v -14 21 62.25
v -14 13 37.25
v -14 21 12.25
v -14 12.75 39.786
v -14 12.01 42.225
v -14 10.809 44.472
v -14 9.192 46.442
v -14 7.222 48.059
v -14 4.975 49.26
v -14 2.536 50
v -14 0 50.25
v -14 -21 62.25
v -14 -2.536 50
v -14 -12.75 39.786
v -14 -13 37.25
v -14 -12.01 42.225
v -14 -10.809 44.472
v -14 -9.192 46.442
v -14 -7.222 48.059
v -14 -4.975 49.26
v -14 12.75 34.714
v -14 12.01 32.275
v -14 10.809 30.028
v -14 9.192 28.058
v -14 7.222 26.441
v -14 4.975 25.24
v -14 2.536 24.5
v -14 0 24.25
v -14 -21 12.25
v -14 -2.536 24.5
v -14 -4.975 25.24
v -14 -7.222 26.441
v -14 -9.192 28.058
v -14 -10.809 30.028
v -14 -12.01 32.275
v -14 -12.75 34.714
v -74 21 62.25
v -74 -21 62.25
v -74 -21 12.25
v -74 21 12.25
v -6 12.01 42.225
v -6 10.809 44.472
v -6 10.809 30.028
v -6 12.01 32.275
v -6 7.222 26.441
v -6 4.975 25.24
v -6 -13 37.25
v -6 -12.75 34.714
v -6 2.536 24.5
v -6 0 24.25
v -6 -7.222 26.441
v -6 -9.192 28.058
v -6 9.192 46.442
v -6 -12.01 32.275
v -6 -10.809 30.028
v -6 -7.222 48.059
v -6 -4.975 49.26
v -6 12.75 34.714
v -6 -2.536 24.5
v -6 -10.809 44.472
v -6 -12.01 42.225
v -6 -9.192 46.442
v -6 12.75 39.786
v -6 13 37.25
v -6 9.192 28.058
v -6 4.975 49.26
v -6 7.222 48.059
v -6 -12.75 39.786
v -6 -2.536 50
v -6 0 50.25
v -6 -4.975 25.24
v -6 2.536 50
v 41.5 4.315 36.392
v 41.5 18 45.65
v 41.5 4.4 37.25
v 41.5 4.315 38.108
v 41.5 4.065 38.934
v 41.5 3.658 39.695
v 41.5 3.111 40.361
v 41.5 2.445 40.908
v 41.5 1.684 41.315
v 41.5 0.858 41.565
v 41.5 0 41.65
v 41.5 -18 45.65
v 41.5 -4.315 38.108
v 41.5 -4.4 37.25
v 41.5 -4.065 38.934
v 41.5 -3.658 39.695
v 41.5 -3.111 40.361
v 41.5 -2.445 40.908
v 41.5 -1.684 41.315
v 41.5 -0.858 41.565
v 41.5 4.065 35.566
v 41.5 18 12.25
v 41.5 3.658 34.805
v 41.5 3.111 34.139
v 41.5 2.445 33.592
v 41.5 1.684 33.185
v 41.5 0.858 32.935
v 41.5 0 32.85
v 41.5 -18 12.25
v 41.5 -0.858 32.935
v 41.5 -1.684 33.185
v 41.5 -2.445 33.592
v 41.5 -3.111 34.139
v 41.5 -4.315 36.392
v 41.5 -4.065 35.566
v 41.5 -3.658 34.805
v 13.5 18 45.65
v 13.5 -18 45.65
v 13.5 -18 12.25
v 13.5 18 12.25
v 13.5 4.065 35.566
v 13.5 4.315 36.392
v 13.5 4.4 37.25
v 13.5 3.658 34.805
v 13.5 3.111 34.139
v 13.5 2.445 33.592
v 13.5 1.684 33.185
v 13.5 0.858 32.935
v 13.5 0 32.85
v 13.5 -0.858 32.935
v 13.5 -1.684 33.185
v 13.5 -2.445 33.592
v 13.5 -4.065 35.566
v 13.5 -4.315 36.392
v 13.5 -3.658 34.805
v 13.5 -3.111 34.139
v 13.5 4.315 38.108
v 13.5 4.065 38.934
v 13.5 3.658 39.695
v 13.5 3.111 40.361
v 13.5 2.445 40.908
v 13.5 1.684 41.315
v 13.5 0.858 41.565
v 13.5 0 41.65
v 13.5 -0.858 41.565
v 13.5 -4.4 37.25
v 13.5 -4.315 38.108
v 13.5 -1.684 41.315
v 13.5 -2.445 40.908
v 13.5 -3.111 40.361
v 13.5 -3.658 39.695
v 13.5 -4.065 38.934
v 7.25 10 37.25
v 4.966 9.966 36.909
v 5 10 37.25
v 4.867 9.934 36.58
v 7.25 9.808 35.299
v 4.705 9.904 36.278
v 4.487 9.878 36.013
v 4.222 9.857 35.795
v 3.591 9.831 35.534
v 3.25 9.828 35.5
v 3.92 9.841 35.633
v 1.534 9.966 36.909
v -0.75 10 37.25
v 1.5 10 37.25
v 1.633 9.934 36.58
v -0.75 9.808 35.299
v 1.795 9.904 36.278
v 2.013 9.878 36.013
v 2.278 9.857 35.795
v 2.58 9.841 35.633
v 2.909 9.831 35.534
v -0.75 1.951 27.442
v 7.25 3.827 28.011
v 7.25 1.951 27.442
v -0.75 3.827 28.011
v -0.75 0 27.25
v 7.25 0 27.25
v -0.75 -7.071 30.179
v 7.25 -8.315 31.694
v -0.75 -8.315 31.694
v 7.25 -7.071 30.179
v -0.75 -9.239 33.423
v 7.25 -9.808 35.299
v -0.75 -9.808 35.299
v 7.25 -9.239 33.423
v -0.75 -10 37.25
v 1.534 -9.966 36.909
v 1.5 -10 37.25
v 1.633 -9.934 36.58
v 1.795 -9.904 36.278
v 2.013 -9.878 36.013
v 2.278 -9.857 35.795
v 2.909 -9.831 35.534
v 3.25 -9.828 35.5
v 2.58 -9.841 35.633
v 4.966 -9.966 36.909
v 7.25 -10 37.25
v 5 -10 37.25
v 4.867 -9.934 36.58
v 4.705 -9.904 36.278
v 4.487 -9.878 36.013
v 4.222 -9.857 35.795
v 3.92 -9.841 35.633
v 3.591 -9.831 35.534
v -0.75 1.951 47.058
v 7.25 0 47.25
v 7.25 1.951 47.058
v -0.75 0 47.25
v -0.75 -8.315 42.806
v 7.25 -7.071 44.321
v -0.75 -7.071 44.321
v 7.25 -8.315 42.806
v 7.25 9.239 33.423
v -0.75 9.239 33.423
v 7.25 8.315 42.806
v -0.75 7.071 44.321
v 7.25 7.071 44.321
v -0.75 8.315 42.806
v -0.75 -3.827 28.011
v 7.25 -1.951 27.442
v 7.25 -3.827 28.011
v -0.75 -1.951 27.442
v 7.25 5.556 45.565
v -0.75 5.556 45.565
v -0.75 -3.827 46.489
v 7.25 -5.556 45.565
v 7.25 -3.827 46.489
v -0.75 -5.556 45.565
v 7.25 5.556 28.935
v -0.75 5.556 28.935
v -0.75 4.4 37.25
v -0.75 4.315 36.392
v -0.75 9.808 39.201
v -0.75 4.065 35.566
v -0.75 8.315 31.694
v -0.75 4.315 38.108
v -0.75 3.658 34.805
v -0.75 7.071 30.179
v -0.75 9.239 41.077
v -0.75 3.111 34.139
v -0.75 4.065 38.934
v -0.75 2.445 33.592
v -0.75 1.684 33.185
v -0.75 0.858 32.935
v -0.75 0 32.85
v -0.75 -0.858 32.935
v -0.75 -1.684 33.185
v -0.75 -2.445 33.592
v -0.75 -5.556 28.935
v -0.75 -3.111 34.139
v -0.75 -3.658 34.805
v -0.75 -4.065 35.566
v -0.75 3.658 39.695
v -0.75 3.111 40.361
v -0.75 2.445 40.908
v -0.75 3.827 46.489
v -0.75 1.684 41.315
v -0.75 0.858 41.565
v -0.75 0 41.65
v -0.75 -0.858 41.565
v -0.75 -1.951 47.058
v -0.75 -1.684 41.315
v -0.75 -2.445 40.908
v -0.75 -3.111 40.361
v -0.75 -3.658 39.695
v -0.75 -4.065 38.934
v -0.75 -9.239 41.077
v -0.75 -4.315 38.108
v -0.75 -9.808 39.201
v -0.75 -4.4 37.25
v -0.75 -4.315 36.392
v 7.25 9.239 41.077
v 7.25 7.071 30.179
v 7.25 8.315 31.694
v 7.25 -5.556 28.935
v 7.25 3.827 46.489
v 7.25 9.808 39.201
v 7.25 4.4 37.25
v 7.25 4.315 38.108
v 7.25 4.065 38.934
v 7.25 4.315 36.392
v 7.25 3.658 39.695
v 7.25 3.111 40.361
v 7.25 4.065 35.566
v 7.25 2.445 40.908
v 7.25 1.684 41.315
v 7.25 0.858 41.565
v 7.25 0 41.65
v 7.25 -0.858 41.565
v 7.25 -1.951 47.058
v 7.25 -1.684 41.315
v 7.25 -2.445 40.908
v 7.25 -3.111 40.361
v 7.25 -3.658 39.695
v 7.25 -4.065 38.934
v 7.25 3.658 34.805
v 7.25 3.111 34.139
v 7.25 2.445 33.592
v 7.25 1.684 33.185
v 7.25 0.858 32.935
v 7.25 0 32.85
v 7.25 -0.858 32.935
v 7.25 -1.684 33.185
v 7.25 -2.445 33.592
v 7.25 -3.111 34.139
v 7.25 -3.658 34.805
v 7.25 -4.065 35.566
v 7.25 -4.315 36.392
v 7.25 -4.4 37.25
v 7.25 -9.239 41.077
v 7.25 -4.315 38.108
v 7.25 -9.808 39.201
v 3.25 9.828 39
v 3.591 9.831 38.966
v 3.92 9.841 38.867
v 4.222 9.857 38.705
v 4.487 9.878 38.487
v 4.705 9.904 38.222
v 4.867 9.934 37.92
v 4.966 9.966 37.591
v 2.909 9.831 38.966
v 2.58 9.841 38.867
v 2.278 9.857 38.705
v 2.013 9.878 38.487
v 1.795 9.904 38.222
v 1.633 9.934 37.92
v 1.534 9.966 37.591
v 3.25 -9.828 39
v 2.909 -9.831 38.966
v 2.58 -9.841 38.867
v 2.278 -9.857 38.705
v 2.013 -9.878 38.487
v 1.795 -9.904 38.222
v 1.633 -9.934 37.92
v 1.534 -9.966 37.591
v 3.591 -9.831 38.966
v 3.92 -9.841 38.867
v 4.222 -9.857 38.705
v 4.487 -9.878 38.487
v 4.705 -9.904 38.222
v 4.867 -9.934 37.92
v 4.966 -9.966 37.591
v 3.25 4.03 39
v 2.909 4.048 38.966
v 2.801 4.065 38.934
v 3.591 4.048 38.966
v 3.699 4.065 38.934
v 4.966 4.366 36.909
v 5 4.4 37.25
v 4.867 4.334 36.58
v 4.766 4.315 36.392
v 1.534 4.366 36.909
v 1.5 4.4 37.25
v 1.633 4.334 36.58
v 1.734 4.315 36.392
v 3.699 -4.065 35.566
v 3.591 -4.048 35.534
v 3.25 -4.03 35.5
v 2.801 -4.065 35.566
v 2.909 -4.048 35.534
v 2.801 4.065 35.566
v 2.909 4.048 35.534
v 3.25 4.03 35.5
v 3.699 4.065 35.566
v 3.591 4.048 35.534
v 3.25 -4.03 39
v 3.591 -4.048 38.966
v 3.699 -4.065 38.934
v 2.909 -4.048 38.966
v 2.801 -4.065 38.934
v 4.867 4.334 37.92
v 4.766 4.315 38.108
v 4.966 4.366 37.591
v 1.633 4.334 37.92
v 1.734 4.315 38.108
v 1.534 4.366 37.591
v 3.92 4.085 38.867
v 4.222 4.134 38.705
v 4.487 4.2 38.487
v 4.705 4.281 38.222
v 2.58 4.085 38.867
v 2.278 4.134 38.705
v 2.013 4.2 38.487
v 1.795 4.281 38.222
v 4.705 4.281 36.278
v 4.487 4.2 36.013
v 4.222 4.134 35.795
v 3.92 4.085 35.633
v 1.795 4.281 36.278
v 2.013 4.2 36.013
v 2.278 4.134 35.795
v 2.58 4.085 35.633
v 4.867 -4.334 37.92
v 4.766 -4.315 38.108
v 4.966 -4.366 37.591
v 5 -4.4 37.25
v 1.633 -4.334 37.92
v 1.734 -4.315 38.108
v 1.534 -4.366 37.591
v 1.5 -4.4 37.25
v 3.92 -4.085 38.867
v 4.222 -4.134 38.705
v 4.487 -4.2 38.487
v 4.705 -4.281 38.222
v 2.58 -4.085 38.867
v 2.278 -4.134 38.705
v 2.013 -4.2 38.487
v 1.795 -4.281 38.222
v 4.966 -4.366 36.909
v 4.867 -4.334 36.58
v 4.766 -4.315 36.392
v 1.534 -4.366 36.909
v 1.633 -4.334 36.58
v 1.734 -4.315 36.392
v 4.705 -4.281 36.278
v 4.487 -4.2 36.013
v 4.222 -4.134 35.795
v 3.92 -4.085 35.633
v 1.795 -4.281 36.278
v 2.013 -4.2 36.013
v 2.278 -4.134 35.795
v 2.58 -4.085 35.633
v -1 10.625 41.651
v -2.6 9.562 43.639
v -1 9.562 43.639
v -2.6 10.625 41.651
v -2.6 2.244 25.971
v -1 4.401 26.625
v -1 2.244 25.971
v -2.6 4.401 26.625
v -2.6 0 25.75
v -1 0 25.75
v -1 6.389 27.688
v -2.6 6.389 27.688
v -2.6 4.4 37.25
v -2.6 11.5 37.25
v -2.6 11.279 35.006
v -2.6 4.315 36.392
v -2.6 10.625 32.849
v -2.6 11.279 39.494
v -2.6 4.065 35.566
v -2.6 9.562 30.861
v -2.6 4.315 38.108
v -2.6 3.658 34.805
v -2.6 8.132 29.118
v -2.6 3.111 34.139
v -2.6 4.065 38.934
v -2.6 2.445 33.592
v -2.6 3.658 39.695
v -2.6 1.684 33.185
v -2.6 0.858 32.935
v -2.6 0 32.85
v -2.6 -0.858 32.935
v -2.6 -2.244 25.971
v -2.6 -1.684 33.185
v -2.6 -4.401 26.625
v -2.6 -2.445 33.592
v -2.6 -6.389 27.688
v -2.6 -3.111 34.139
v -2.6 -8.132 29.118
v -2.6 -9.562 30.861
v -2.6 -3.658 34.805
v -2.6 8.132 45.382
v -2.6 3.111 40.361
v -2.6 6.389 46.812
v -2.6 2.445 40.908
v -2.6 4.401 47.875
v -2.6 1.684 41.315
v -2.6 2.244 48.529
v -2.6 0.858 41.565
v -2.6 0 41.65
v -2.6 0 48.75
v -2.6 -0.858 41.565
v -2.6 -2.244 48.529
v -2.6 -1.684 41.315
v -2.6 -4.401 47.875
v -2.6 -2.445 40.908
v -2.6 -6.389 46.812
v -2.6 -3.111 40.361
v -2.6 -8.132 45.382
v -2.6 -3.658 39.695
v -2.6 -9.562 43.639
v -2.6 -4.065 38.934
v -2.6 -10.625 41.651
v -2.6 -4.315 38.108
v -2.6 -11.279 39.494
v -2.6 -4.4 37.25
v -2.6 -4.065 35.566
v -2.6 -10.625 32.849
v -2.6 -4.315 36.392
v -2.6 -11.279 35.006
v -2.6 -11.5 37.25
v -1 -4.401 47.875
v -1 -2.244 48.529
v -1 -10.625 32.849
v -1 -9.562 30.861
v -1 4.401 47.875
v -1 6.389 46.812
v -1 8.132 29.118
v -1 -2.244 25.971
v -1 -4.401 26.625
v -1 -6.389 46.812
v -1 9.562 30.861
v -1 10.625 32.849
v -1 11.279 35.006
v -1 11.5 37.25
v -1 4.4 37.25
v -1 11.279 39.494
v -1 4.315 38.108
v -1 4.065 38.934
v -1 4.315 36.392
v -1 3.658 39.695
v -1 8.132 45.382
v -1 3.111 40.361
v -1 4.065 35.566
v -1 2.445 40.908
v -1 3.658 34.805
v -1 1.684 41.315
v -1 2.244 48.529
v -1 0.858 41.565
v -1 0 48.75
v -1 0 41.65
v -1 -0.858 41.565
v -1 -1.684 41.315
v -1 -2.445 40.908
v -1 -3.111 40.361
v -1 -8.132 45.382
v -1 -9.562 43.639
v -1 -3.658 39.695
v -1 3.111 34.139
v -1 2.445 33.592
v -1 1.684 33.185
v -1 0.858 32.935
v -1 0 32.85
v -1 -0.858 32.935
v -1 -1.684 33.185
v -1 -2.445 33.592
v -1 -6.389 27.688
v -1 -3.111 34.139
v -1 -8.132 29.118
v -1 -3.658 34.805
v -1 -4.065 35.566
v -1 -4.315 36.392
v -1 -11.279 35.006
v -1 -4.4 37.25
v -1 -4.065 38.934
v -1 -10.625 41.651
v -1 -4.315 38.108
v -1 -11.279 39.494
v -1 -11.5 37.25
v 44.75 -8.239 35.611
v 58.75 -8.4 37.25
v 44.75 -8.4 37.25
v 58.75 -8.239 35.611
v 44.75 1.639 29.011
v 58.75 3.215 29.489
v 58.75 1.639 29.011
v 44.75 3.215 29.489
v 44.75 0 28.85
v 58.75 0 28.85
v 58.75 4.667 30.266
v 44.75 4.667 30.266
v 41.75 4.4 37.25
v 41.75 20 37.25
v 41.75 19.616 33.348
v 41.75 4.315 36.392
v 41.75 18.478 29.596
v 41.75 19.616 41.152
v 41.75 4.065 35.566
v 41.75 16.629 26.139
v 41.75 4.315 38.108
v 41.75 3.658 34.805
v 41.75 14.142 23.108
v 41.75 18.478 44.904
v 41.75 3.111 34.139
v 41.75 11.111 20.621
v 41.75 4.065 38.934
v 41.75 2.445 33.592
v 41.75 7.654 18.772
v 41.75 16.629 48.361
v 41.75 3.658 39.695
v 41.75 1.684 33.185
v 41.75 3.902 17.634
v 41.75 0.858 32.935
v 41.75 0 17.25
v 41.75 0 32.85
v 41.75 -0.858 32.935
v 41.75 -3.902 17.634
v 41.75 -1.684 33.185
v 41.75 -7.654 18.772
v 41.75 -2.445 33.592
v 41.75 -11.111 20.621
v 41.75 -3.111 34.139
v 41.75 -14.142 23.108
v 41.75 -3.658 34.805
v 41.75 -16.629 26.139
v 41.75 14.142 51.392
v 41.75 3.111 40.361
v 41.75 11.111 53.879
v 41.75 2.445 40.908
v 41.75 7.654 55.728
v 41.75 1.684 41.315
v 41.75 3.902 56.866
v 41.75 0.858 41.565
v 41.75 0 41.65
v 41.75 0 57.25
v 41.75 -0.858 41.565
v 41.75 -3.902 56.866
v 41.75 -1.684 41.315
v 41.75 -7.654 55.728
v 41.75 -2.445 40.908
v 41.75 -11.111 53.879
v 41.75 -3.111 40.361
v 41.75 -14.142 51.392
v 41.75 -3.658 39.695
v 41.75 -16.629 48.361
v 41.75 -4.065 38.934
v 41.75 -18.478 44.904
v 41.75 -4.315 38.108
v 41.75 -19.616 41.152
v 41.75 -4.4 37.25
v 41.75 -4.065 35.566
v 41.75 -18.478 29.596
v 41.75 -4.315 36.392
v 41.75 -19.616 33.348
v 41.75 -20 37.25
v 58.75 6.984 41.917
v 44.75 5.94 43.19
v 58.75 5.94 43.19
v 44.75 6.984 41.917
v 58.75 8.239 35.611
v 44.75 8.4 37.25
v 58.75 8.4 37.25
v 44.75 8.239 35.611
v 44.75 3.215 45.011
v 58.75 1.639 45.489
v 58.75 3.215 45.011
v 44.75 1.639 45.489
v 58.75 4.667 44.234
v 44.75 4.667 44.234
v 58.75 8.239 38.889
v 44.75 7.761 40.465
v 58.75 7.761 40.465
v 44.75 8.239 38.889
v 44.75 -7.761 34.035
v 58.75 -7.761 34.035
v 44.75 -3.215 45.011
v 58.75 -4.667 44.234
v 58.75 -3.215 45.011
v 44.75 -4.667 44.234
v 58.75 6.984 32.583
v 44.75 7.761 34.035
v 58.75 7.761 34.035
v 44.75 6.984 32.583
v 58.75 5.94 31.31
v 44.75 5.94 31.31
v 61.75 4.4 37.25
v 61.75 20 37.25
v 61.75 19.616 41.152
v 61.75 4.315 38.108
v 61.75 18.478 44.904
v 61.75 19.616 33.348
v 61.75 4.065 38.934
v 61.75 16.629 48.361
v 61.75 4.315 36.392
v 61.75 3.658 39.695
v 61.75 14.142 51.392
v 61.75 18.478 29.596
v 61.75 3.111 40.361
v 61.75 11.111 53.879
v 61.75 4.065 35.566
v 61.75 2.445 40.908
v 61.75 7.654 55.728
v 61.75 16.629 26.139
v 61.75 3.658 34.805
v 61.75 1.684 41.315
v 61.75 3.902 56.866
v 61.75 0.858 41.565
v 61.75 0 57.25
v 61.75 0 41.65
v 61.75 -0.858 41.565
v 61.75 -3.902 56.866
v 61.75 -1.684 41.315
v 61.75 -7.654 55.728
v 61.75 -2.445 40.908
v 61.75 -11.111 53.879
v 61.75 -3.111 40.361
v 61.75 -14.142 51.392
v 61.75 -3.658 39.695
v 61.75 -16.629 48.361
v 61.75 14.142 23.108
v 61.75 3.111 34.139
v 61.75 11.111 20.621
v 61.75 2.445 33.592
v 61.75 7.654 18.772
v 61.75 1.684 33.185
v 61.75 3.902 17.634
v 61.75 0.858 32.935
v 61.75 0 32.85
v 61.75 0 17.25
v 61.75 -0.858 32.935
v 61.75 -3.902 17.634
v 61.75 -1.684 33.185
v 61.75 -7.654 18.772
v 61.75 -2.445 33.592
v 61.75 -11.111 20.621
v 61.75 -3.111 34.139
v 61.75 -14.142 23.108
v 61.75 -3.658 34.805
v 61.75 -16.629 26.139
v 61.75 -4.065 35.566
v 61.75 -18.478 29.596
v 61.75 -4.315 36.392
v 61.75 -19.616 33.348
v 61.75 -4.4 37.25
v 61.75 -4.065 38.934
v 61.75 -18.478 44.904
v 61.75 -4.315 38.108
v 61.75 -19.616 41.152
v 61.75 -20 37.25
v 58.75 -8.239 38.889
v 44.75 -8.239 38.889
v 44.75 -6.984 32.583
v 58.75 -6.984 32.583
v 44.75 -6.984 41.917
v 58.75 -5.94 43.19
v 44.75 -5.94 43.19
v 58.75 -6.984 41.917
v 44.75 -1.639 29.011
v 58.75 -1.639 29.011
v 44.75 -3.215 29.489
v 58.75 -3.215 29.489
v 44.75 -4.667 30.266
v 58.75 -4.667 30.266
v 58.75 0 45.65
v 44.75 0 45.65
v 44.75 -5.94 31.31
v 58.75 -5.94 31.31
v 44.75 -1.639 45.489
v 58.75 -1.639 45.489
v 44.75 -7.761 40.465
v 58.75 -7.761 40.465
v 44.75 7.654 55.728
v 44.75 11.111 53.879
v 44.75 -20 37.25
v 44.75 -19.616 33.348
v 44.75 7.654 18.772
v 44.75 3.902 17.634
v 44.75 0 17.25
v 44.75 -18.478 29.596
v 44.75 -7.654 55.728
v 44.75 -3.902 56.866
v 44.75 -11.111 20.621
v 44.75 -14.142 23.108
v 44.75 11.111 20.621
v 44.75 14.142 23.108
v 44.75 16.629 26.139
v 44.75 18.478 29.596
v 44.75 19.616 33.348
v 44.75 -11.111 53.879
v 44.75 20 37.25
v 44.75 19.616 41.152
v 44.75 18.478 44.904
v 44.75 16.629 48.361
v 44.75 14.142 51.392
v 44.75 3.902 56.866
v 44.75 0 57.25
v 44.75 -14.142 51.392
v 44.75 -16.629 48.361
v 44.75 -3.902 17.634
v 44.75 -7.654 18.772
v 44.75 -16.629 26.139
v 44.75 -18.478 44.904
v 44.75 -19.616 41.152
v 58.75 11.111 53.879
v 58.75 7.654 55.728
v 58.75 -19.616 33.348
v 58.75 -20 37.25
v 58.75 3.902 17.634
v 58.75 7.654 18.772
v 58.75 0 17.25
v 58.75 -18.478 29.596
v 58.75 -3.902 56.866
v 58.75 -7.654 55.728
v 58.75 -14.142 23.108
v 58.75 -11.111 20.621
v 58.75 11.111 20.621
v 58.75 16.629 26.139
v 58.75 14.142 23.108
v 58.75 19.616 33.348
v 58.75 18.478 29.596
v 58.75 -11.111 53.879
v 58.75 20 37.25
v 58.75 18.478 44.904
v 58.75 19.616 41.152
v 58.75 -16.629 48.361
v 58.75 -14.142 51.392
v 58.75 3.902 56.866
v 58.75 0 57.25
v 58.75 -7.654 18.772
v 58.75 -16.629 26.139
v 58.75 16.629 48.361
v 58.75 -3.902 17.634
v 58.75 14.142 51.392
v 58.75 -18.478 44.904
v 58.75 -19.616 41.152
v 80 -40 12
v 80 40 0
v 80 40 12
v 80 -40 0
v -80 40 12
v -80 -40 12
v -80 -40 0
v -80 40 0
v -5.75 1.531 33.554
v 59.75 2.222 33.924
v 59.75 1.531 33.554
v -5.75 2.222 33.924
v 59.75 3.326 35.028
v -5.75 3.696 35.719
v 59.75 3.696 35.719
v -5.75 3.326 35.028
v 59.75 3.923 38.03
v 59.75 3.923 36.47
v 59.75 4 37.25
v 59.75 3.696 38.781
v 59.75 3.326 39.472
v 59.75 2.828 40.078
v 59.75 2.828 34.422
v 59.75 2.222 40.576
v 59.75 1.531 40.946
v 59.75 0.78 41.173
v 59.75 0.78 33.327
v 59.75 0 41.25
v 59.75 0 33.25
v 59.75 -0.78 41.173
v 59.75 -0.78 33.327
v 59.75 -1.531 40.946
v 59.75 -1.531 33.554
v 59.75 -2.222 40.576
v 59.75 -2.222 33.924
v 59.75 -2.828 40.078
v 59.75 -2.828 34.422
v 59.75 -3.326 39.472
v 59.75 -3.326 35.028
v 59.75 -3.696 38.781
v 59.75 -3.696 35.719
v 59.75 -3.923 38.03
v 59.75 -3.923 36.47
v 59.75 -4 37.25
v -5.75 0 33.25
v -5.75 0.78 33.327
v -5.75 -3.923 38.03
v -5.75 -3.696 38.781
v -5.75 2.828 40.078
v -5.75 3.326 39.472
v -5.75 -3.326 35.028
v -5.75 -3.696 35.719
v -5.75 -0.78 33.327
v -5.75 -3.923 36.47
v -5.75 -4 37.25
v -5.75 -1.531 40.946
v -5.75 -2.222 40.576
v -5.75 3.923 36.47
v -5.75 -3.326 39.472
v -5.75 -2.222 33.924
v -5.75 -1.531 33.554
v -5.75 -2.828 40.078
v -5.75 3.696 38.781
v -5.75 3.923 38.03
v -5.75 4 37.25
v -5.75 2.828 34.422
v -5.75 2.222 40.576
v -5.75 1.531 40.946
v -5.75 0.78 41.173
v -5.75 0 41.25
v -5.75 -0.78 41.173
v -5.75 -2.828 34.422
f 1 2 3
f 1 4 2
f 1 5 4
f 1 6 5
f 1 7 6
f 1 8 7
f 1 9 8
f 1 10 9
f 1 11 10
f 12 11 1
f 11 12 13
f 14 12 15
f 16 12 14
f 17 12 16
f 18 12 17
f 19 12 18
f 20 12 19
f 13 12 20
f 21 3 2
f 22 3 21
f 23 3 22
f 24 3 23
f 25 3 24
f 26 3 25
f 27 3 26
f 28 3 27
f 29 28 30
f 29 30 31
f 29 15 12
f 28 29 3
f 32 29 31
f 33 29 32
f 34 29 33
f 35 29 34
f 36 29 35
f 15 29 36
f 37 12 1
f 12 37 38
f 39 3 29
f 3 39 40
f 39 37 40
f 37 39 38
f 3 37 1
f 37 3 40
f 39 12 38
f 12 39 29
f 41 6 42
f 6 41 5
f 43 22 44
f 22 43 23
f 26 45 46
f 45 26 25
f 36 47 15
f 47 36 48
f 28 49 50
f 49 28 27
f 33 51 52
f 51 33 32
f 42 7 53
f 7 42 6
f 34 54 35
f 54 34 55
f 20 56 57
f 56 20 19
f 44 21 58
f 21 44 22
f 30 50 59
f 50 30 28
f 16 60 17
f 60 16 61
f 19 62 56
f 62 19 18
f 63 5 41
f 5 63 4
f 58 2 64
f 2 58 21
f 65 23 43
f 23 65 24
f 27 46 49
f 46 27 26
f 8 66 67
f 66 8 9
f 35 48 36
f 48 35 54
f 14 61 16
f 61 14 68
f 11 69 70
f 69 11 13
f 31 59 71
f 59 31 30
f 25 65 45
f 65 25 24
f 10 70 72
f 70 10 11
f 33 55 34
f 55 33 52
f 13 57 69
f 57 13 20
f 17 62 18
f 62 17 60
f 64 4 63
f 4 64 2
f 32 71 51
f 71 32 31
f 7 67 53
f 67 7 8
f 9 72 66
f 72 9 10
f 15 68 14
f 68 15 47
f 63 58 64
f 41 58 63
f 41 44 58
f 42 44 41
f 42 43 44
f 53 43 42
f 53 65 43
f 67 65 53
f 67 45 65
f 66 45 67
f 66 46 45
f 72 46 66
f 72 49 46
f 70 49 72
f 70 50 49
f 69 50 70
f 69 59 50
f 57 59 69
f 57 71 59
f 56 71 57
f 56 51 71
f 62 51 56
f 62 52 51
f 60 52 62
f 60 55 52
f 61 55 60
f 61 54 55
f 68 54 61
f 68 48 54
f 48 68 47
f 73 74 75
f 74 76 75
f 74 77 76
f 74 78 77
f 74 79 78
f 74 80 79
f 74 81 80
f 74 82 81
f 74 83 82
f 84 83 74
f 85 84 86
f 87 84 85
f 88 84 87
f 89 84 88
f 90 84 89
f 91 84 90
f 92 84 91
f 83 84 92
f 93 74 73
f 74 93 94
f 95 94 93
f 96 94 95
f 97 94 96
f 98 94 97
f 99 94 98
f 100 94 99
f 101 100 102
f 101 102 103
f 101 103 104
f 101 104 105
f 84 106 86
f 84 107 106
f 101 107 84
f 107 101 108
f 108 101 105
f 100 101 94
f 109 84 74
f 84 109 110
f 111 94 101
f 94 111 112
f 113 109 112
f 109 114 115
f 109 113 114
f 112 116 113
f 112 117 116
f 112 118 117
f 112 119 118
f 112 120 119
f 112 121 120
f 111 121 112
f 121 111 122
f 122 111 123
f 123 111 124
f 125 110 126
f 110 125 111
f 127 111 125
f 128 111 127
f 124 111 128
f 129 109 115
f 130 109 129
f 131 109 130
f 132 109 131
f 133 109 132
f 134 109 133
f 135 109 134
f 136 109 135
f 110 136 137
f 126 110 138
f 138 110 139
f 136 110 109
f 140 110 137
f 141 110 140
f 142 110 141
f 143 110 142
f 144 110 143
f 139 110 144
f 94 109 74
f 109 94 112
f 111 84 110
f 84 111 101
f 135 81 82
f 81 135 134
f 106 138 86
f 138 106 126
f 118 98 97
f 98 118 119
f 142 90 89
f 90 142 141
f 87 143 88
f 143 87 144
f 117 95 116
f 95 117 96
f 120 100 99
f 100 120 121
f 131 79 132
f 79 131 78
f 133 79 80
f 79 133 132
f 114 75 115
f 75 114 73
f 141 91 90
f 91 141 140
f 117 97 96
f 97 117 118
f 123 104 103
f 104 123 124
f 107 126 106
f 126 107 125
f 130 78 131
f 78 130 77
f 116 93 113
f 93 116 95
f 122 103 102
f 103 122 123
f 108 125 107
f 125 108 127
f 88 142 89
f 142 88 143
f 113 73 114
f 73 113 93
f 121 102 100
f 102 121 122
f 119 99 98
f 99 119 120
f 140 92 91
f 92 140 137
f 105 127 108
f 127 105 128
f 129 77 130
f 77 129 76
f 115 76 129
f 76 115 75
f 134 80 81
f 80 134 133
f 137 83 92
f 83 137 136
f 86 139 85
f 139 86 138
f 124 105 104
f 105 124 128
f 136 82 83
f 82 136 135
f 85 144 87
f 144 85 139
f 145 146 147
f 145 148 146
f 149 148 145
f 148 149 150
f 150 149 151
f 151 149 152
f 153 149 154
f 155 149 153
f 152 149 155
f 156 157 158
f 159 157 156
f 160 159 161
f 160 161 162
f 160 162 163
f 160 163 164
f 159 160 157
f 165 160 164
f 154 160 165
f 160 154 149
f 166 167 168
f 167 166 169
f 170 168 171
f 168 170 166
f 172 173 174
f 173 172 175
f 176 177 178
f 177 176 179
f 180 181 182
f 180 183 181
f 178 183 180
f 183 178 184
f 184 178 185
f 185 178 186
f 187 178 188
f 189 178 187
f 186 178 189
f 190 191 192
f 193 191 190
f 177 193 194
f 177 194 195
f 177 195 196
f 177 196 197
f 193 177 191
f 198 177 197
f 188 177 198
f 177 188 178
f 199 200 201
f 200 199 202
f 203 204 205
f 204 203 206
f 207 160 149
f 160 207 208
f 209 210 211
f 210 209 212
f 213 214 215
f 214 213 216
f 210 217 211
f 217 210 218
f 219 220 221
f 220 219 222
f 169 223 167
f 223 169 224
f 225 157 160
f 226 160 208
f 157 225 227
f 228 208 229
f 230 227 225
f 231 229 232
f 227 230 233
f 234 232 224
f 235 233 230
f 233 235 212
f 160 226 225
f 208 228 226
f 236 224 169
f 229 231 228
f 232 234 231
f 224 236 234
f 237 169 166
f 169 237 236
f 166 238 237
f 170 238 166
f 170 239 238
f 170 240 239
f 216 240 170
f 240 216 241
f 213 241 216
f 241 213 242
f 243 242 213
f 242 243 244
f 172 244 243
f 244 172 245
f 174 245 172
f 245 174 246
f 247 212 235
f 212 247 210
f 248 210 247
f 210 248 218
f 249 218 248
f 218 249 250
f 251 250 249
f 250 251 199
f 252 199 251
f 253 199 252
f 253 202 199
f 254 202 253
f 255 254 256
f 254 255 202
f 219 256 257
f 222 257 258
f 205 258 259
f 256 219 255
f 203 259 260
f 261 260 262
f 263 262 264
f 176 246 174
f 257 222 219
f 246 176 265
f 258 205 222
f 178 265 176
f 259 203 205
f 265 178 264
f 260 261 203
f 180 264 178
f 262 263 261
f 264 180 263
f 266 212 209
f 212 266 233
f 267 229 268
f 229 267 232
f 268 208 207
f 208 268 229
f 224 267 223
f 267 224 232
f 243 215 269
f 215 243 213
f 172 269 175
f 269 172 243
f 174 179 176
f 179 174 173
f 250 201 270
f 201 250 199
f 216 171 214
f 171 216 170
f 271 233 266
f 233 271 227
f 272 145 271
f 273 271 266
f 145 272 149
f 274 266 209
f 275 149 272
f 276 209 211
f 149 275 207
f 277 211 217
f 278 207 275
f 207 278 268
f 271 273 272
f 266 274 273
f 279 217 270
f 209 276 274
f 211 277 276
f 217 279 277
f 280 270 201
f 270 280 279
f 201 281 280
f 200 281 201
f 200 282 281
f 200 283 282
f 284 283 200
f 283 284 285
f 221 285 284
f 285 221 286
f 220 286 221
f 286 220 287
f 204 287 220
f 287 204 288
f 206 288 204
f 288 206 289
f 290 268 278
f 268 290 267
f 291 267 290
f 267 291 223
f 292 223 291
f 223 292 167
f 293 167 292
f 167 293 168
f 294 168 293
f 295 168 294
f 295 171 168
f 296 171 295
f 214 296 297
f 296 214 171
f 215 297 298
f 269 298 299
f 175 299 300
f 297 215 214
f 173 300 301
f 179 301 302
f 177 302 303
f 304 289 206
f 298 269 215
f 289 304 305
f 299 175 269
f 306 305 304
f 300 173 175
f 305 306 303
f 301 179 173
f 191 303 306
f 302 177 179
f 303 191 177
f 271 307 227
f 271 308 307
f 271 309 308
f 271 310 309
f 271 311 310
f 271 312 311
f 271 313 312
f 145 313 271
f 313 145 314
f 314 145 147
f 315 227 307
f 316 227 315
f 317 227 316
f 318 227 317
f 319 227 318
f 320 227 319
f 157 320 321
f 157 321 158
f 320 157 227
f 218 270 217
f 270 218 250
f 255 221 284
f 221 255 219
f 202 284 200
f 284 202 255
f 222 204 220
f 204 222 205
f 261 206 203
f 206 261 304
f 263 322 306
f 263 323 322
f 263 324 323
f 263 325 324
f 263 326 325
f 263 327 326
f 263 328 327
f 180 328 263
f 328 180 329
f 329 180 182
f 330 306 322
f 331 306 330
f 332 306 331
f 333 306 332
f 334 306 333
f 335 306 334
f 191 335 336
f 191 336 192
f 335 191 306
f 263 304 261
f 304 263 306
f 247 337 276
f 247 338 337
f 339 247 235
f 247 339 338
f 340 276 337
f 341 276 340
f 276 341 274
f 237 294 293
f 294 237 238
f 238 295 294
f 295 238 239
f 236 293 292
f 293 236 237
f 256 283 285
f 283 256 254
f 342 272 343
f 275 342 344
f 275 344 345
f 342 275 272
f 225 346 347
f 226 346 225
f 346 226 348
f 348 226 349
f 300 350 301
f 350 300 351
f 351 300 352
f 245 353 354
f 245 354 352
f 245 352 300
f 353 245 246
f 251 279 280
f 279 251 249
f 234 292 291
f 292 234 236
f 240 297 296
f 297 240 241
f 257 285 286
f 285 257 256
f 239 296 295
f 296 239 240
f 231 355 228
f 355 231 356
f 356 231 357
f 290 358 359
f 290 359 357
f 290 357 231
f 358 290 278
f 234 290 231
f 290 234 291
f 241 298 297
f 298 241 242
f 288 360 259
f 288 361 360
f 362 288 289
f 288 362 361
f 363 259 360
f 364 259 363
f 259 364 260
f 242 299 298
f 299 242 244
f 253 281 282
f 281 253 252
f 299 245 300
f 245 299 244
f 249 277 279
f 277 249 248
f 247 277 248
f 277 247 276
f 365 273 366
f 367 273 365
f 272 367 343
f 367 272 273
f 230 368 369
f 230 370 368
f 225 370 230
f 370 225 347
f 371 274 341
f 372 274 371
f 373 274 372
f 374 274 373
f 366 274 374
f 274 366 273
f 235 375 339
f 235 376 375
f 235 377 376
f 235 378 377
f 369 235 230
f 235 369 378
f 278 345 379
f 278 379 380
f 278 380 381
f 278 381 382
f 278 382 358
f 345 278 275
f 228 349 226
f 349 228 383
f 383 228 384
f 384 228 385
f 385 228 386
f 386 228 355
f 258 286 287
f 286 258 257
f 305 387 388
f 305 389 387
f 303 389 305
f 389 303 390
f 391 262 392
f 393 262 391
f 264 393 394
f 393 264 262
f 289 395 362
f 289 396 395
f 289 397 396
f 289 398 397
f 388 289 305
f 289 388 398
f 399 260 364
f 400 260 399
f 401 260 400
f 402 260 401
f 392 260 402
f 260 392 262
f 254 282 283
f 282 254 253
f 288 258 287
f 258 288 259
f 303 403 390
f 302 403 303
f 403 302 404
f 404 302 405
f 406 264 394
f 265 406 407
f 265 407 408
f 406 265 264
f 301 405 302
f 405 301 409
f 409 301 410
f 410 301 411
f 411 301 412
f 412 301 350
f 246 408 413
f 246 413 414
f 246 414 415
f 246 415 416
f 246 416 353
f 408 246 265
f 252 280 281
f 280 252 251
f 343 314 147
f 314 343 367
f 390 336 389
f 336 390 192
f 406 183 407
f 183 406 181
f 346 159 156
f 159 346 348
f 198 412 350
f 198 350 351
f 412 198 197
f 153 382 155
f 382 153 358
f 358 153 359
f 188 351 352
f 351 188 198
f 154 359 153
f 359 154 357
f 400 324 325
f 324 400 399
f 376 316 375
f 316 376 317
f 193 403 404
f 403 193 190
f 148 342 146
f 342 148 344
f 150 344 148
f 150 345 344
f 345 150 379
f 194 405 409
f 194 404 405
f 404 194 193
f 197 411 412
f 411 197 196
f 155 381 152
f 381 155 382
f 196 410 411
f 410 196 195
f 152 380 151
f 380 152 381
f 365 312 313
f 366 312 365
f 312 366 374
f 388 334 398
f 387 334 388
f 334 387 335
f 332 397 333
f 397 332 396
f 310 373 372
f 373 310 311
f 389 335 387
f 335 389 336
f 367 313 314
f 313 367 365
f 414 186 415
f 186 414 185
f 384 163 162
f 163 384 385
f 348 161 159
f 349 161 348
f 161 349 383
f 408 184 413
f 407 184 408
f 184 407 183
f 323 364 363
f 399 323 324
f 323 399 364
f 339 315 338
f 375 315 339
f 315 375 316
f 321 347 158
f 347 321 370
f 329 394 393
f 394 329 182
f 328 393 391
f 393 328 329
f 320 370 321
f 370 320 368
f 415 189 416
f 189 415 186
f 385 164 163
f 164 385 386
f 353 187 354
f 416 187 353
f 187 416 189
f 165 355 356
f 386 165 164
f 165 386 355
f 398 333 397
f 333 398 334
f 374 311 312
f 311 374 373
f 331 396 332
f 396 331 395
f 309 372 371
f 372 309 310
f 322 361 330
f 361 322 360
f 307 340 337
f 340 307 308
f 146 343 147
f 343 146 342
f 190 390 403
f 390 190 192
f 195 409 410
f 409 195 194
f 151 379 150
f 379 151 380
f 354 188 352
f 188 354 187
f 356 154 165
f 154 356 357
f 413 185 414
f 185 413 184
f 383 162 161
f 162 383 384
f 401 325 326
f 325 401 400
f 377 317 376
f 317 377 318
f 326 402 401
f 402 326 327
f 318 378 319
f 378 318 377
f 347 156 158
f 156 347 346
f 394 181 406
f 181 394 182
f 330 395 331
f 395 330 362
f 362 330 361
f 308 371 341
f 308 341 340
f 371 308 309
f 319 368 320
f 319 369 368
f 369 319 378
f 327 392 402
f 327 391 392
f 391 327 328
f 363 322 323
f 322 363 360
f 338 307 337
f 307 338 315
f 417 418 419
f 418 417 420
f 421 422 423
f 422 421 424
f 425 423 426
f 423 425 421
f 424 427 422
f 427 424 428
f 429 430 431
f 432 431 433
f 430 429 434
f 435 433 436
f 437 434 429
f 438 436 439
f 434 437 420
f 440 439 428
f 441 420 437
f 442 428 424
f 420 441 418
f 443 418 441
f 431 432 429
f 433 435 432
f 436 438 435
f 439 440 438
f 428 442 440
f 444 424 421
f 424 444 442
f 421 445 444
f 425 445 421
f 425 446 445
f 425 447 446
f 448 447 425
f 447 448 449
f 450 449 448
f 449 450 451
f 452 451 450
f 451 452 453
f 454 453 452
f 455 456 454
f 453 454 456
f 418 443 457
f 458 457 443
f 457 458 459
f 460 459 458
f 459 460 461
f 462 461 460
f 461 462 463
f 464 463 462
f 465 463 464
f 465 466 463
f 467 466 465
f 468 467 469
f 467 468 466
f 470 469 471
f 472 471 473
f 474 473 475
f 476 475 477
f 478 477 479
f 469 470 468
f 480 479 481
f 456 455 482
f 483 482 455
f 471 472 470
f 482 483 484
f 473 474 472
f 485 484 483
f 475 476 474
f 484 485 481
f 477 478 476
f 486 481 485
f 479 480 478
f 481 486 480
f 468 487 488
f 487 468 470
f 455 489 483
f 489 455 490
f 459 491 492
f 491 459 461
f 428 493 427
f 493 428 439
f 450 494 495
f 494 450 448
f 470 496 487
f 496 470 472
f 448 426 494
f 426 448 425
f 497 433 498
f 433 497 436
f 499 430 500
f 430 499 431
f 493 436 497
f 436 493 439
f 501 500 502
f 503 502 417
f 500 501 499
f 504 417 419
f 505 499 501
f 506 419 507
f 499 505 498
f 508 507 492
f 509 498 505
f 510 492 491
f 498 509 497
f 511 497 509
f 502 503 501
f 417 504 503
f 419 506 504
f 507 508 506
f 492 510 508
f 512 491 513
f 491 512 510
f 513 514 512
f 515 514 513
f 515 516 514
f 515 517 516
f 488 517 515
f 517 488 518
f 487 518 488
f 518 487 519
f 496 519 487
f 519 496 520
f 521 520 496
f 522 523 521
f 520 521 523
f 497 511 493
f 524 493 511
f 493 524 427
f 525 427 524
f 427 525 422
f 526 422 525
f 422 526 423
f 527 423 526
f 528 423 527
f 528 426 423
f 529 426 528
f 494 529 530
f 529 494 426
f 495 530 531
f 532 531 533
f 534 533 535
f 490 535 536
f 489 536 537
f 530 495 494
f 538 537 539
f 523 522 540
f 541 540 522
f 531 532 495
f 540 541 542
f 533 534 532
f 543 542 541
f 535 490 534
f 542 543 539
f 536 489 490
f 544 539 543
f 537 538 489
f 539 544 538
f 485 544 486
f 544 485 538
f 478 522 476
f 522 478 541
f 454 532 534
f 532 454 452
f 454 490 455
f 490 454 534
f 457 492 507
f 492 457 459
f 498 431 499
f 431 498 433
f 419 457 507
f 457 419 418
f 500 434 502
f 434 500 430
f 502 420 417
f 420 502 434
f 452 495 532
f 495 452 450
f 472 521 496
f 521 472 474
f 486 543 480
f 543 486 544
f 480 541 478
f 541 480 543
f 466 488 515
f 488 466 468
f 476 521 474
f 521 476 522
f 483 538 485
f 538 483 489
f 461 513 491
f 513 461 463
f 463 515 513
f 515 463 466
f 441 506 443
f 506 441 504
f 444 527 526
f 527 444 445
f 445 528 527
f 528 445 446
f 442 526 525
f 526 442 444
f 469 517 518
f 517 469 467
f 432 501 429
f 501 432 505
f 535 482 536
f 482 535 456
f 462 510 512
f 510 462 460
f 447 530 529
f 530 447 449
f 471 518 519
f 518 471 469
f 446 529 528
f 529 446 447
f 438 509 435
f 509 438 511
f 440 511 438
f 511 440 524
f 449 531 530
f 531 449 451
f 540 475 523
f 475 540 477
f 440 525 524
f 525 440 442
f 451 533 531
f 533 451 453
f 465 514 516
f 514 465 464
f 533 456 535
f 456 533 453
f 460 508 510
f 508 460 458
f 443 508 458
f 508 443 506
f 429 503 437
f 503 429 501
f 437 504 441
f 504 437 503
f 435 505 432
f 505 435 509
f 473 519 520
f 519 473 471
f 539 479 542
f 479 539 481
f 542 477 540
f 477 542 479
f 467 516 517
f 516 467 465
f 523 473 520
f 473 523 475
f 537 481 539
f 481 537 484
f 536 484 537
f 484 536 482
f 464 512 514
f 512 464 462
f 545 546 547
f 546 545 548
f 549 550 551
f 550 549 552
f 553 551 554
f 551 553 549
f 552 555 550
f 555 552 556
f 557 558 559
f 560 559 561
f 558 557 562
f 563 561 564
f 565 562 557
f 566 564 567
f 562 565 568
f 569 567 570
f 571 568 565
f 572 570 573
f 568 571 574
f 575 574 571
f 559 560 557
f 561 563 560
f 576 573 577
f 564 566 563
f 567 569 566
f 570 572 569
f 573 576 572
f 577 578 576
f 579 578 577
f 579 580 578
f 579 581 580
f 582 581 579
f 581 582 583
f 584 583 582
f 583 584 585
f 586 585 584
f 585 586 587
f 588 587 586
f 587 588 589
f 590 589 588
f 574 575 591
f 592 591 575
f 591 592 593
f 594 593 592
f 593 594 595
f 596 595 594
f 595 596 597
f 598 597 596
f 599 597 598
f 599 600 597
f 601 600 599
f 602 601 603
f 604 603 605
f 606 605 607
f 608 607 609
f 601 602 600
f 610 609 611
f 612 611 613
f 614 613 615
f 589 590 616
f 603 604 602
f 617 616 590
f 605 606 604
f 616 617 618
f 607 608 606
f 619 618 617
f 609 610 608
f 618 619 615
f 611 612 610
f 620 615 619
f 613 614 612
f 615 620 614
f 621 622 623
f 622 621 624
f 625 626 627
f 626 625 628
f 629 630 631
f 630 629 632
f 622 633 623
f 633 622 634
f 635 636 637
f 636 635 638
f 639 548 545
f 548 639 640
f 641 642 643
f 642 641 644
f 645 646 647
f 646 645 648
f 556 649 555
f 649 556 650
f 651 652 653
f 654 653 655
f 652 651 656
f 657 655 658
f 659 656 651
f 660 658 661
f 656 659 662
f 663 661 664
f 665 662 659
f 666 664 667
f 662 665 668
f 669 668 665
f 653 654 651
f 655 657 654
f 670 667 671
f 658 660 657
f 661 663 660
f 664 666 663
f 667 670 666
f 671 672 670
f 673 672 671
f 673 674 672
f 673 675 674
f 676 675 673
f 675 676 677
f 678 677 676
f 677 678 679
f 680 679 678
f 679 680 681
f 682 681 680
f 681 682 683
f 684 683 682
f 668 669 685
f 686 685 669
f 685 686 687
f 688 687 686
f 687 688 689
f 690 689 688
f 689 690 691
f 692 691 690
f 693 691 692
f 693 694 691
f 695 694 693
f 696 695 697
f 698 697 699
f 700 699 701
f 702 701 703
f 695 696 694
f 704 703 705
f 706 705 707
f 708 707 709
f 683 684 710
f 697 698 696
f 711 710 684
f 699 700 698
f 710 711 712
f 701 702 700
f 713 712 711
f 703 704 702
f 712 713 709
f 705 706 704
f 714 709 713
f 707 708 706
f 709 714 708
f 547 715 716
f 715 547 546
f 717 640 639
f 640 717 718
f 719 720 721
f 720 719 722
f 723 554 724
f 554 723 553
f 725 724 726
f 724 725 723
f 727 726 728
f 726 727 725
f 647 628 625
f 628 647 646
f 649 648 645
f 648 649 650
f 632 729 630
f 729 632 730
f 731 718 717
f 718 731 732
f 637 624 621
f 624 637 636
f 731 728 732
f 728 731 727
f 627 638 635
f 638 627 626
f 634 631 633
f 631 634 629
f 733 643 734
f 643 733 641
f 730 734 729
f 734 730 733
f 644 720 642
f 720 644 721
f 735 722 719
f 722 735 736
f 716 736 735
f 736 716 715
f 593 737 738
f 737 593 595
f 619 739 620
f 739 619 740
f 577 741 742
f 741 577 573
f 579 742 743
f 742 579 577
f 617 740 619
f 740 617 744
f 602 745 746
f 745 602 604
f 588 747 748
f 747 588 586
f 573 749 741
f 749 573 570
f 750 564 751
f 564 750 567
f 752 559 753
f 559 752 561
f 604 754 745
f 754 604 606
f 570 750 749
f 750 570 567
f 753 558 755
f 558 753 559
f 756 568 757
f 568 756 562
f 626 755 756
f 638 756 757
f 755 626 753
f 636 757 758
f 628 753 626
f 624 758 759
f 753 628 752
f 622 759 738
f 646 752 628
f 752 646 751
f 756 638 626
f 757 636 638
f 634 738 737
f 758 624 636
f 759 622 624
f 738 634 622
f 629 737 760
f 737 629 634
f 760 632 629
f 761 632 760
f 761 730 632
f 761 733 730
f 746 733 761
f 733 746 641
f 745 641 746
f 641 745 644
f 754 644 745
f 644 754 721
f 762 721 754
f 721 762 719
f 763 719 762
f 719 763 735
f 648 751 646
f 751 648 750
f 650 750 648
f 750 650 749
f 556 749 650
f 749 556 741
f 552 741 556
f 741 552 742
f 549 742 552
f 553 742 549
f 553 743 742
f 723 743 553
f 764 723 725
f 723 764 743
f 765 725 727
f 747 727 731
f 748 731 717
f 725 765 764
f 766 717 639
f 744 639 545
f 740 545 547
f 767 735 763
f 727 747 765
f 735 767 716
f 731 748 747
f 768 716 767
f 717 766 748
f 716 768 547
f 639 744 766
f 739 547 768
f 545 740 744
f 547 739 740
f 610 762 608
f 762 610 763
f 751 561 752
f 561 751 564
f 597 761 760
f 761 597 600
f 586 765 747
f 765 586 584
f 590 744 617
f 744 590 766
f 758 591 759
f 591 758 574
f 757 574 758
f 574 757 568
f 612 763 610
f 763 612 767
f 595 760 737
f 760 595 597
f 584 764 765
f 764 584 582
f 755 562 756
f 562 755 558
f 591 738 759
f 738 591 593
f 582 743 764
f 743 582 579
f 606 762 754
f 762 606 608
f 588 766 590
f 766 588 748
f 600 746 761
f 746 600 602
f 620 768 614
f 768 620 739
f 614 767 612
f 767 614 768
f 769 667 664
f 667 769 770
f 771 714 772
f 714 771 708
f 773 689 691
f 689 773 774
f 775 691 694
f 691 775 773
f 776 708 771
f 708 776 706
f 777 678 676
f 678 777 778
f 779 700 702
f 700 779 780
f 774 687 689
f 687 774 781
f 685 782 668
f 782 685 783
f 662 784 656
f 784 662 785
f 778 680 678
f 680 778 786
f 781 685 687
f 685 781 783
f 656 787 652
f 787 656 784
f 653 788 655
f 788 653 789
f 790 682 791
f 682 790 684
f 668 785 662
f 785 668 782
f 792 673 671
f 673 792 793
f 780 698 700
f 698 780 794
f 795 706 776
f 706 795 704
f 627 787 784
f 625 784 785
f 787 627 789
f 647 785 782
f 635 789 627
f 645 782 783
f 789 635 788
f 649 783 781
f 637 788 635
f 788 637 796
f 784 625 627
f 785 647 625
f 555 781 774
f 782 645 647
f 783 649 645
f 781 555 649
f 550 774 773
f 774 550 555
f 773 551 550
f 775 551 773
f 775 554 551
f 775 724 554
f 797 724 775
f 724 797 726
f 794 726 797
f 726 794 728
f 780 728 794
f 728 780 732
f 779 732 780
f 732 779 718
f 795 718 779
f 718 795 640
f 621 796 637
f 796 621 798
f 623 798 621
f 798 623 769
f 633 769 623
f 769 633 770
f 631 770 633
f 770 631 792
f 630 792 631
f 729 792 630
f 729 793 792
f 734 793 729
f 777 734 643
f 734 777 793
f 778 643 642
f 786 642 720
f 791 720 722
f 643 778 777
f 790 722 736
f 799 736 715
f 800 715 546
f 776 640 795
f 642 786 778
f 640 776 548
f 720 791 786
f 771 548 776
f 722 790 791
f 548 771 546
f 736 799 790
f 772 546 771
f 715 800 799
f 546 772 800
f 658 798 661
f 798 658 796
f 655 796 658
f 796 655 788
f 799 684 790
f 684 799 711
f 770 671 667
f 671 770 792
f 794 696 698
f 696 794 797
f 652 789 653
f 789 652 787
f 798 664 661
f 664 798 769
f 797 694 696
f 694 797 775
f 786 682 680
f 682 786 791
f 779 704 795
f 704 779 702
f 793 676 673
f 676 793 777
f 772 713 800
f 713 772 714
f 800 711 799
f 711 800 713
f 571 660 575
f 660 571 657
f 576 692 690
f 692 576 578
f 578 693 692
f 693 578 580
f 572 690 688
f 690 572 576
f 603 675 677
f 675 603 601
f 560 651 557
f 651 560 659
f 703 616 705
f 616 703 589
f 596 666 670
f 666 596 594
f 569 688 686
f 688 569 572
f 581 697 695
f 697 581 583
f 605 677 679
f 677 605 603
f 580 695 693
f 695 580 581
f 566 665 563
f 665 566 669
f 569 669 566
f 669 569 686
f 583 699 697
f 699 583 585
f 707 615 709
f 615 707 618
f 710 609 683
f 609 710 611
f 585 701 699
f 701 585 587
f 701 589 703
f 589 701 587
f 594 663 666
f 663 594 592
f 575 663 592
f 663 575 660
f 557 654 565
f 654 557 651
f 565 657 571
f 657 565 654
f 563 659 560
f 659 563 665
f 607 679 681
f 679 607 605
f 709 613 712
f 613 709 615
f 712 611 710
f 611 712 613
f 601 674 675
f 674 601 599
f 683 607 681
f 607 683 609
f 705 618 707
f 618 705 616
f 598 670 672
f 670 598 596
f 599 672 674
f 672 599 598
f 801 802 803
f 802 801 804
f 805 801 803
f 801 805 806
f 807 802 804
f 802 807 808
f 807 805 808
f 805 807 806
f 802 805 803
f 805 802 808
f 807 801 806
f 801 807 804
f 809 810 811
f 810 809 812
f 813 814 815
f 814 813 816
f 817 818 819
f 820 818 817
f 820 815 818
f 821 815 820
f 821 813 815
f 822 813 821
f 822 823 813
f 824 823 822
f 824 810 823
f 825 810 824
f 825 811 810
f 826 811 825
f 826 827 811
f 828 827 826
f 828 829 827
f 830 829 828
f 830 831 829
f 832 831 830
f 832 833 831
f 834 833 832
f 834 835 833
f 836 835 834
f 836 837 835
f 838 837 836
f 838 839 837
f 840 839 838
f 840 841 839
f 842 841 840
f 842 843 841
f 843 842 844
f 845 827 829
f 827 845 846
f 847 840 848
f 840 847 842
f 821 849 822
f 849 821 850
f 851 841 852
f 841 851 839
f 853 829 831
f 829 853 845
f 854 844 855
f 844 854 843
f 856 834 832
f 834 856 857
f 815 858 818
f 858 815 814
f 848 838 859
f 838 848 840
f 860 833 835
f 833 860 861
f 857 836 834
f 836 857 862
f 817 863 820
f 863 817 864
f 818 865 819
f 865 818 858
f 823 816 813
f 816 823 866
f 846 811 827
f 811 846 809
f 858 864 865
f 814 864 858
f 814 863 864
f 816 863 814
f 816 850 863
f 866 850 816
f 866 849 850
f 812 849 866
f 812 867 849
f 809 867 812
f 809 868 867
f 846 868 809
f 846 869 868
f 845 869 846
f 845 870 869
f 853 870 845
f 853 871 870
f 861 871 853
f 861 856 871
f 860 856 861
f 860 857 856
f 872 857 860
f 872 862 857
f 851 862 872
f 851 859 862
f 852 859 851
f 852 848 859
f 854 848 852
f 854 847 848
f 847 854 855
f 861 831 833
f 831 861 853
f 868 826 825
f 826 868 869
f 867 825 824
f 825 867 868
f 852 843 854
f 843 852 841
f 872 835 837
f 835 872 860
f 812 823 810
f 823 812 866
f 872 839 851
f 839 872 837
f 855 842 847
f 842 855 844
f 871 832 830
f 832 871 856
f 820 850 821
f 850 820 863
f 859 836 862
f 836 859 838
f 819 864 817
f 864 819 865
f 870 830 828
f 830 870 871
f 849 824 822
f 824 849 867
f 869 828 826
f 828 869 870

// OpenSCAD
$fn = 32;

// ------------------------------------------------------------------------
// Motor drive station: motor 60 x 50 mm, shaft d8, pulley d40
// Every part is its own module, assembly() places every instance.
// ------------------------------------------------------------------------

// --- part 1 ---
module station_bed() {
  difference() {
    translate([-80, -40, 0]) cube([160, 80, 12]);
  }
}

// --- part 2 ---
module drive_motor() {
  union() {
    translate([-30, -21, 0]) cube([60, 42, 50]);
    translate([34, 0, 25]) rotate([0, 90, 0]) cylinder(h = 8, d = 26, center = true);
  }
}

// --- part 3 ---
module pillow_block() {
  difference() {
    translate([-14, -18, 0]) cube([28, 36, 33.4]);
    translate([0, 0, 25]) rotate([0, 90, 0]) cylinder(h = 30, d = 8.8, center = true);
  }
}

// --- part 4 ---
module drive_shaft() {
  translate([0, 0, -32.75]) cylinder(h = 65.5, d = 8);
}

// --- part 5 ---
module shaft_collar() {
  difference() {
    cylinder(h = 8, d = 20);
    translate([0, 0, -1]) cylinder(h = 10, d = 8.8);
    translate([0, 0, 4]) rotate([90, 0, 0]) cylinder(h = 22, d = 3.5, center = true);
  }
}

// --- part 6 ---
module collar_washer() {
  difference() {
      translate([0, 0, 0]) cylinder(h = 1.6, d = 23);
      translate([0, 0, -1]) cylinder(h = 3.6, d = 8.8);
    }
}

// --- part 7 ---
module drive_pulley() {
  difference() {
    union() {
      cylinder(h = 20, d = 16.8);
      cylinder(h = 3, d = 40);
      translate([0, 0, 17]) cylinder(h = 3, d = 40);
    }
    translate([0, 0, -1]) cylinder(h = 22, d = 8.8);
  }
}

// --- assembly ---
module assembly() {
  color([0.80, 0.24, 0.20]) translate([0, 0, 0]) rotate([0, 0, 0]) station_bed();
  color([0.20, 0.45, 0.75]) translate([-44, 0, 12.25]) rotate([0, 0, 0]) drive_motor();
  color([0.25, 0.62, 0.32]) translate([27.5, 0, 12.25]) rotate([0, 0, 0]) pillow_block();
  color([0.92, 0.70, 0.18]) translate([27, 0, 37.25]) rotate([0, 90, 0]) drive_shaft();
  color([0.58, 0.35, 0.70]) translate([-0.75, 0, 37.25]) rotate([0, 90, 0]) shaft_collar();
  color([0.16, 0.66, 0.66]) translate([-2.6, 0, 37.25]) rotate([0, 90, 0]) collar_washer();
  color([0.85, 0.48, 0.18]) translate([41.75, 0, 37.25]) rotate([0, 90, 0]) drive_pulley();
}

assembly();
